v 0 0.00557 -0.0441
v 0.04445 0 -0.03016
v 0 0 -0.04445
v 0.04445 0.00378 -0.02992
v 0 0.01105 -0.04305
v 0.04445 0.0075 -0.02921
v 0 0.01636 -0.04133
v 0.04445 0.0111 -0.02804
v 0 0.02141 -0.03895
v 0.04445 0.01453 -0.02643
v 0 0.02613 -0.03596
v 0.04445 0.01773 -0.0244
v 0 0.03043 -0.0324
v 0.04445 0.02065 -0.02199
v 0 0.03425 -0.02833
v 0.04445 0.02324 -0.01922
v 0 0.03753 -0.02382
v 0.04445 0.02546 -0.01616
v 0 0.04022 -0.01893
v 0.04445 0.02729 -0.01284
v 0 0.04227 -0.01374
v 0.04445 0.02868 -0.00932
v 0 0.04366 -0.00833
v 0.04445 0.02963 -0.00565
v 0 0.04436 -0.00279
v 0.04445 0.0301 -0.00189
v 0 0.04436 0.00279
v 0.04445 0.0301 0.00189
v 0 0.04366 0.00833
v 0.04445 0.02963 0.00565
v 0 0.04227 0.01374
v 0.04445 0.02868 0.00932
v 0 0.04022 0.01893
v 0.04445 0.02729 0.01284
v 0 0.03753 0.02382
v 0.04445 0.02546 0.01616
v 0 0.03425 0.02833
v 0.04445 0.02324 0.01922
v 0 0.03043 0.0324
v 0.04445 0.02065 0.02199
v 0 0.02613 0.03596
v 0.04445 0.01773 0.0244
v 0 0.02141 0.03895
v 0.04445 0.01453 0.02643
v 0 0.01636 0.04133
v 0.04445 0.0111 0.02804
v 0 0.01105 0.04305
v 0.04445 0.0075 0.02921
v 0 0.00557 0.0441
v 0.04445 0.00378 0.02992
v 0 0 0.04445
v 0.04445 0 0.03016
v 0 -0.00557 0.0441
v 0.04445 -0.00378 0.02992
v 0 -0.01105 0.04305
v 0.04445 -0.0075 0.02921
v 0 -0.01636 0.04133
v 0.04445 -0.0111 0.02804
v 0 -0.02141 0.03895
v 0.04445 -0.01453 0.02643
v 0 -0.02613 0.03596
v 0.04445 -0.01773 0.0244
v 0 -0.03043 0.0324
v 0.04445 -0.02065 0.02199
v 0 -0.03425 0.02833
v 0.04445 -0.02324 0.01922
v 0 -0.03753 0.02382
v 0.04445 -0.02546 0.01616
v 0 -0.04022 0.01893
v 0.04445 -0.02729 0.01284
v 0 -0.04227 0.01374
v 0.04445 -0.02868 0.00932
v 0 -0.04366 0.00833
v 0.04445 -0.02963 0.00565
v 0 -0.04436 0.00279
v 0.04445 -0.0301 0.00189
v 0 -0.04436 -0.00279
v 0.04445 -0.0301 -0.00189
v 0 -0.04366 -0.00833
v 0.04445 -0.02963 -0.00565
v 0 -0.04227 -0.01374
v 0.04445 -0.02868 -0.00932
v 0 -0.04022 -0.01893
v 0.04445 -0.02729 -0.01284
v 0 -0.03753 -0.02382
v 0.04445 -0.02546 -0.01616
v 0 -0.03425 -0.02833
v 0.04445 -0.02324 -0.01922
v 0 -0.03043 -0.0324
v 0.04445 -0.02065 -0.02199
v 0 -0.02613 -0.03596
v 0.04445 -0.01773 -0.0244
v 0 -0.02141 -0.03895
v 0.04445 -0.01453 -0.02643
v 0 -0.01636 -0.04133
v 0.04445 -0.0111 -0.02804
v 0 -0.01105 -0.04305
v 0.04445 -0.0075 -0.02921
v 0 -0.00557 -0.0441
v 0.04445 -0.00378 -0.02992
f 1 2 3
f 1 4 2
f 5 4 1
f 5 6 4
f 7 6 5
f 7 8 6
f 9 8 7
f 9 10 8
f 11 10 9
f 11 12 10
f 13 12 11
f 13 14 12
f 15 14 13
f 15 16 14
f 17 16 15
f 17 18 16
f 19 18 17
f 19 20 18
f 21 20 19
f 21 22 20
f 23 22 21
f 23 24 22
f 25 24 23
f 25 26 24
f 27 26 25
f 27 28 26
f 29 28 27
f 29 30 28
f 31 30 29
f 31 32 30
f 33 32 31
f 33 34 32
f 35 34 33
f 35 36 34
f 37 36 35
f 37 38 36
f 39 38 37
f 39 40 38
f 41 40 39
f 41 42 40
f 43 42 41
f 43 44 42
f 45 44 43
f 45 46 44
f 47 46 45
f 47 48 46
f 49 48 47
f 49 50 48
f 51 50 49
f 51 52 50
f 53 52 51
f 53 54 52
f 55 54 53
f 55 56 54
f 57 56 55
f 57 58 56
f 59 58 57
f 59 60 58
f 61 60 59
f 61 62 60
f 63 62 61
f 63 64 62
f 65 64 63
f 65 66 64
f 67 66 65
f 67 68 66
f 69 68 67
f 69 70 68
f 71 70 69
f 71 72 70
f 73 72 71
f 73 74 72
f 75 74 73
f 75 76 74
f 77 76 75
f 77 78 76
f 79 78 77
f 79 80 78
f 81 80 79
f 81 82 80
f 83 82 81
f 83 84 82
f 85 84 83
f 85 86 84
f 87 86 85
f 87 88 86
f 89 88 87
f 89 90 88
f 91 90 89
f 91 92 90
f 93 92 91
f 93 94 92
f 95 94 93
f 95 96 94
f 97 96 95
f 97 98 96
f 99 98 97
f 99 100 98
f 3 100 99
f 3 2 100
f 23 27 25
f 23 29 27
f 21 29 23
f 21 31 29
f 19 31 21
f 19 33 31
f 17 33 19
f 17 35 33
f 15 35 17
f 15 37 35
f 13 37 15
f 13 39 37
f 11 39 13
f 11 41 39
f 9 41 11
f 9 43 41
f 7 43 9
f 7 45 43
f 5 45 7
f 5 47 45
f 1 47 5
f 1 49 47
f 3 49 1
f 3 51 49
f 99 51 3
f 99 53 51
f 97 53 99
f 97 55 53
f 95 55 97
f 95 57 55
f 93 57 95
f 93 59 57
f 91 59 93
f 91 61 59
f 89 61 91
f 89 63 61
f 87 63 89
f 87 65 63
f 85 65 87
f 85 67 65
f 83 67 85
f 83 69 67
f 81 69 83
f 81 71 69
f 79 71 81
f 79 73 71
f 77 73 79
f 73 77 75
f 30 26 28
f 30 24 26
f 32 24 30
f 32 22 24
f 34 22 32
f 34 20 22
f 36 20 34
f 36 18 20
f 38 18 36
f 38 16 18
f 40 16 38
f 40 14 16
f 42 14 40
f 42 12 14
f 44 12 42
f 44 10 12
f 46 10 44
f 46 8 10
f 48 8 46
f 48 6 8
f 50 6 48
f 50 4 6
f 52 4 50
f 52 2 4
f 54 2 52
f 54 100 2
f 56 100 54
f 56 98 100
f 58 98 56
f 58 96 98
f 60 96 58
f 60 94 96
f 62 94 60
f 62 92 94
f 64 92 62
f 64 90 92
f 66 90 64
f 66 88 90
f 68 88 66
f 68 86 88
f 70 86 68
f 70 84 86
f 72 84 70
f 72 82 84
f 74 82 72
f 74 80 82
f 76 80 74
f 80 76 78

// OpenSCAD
$fn=50;  // REMOVE
LENGTH = 0; // REMOVE
DO = 0.0889; // REMOVE
WALLTHICKNESS = 0.00391; // REMOVE
PARAM1 = 1.28; // REMOVE
PARAM2 = 0; // REMOVE
ANGLE_VERTICAL = 90; // REMOVE
ANGLE_AZIMUTHAL = 0; // REMOVE
ANGLE_AXIS = 0; // REMOVE
COORDS1_LOC = [0.0000,0.0000,0.0000]; // REMOVE
C1_DO = 0.0889; // REMOVE
C1_ANGLE_VERTICAL = 90; // REMOVE
C1_ANGLE_AZIMUTHAL = 0; // REMOVE
C1_ANGLE_AXIS = 0; // REMOVE
C2_DO = 0.06032; // REMOVE
C2_ANGLE_VERTICAL = 90; // REMOVE
C2_ANGLE_AZIMUTHAL = 0; // REMOVE
C2_ANGLE_AXIS = 0; // REMOVE
//rotate([(C1_ANGLE_AXIS),-1*(C1_ANGLE_VERTICAL),-1*(C1_ANGLE_AZIMUTHAL)])
rotate([0, 90, 0])
translate([0, 0, ((C1_DO)>(C2_DO))?(C1_DO)/4:-(C2_DO)/4])
cylinder(h = max((C1_DO),(C2_DO))/2, r1 = (C1_DO)/2, r2 = (C2_DO)/2, center = true);
